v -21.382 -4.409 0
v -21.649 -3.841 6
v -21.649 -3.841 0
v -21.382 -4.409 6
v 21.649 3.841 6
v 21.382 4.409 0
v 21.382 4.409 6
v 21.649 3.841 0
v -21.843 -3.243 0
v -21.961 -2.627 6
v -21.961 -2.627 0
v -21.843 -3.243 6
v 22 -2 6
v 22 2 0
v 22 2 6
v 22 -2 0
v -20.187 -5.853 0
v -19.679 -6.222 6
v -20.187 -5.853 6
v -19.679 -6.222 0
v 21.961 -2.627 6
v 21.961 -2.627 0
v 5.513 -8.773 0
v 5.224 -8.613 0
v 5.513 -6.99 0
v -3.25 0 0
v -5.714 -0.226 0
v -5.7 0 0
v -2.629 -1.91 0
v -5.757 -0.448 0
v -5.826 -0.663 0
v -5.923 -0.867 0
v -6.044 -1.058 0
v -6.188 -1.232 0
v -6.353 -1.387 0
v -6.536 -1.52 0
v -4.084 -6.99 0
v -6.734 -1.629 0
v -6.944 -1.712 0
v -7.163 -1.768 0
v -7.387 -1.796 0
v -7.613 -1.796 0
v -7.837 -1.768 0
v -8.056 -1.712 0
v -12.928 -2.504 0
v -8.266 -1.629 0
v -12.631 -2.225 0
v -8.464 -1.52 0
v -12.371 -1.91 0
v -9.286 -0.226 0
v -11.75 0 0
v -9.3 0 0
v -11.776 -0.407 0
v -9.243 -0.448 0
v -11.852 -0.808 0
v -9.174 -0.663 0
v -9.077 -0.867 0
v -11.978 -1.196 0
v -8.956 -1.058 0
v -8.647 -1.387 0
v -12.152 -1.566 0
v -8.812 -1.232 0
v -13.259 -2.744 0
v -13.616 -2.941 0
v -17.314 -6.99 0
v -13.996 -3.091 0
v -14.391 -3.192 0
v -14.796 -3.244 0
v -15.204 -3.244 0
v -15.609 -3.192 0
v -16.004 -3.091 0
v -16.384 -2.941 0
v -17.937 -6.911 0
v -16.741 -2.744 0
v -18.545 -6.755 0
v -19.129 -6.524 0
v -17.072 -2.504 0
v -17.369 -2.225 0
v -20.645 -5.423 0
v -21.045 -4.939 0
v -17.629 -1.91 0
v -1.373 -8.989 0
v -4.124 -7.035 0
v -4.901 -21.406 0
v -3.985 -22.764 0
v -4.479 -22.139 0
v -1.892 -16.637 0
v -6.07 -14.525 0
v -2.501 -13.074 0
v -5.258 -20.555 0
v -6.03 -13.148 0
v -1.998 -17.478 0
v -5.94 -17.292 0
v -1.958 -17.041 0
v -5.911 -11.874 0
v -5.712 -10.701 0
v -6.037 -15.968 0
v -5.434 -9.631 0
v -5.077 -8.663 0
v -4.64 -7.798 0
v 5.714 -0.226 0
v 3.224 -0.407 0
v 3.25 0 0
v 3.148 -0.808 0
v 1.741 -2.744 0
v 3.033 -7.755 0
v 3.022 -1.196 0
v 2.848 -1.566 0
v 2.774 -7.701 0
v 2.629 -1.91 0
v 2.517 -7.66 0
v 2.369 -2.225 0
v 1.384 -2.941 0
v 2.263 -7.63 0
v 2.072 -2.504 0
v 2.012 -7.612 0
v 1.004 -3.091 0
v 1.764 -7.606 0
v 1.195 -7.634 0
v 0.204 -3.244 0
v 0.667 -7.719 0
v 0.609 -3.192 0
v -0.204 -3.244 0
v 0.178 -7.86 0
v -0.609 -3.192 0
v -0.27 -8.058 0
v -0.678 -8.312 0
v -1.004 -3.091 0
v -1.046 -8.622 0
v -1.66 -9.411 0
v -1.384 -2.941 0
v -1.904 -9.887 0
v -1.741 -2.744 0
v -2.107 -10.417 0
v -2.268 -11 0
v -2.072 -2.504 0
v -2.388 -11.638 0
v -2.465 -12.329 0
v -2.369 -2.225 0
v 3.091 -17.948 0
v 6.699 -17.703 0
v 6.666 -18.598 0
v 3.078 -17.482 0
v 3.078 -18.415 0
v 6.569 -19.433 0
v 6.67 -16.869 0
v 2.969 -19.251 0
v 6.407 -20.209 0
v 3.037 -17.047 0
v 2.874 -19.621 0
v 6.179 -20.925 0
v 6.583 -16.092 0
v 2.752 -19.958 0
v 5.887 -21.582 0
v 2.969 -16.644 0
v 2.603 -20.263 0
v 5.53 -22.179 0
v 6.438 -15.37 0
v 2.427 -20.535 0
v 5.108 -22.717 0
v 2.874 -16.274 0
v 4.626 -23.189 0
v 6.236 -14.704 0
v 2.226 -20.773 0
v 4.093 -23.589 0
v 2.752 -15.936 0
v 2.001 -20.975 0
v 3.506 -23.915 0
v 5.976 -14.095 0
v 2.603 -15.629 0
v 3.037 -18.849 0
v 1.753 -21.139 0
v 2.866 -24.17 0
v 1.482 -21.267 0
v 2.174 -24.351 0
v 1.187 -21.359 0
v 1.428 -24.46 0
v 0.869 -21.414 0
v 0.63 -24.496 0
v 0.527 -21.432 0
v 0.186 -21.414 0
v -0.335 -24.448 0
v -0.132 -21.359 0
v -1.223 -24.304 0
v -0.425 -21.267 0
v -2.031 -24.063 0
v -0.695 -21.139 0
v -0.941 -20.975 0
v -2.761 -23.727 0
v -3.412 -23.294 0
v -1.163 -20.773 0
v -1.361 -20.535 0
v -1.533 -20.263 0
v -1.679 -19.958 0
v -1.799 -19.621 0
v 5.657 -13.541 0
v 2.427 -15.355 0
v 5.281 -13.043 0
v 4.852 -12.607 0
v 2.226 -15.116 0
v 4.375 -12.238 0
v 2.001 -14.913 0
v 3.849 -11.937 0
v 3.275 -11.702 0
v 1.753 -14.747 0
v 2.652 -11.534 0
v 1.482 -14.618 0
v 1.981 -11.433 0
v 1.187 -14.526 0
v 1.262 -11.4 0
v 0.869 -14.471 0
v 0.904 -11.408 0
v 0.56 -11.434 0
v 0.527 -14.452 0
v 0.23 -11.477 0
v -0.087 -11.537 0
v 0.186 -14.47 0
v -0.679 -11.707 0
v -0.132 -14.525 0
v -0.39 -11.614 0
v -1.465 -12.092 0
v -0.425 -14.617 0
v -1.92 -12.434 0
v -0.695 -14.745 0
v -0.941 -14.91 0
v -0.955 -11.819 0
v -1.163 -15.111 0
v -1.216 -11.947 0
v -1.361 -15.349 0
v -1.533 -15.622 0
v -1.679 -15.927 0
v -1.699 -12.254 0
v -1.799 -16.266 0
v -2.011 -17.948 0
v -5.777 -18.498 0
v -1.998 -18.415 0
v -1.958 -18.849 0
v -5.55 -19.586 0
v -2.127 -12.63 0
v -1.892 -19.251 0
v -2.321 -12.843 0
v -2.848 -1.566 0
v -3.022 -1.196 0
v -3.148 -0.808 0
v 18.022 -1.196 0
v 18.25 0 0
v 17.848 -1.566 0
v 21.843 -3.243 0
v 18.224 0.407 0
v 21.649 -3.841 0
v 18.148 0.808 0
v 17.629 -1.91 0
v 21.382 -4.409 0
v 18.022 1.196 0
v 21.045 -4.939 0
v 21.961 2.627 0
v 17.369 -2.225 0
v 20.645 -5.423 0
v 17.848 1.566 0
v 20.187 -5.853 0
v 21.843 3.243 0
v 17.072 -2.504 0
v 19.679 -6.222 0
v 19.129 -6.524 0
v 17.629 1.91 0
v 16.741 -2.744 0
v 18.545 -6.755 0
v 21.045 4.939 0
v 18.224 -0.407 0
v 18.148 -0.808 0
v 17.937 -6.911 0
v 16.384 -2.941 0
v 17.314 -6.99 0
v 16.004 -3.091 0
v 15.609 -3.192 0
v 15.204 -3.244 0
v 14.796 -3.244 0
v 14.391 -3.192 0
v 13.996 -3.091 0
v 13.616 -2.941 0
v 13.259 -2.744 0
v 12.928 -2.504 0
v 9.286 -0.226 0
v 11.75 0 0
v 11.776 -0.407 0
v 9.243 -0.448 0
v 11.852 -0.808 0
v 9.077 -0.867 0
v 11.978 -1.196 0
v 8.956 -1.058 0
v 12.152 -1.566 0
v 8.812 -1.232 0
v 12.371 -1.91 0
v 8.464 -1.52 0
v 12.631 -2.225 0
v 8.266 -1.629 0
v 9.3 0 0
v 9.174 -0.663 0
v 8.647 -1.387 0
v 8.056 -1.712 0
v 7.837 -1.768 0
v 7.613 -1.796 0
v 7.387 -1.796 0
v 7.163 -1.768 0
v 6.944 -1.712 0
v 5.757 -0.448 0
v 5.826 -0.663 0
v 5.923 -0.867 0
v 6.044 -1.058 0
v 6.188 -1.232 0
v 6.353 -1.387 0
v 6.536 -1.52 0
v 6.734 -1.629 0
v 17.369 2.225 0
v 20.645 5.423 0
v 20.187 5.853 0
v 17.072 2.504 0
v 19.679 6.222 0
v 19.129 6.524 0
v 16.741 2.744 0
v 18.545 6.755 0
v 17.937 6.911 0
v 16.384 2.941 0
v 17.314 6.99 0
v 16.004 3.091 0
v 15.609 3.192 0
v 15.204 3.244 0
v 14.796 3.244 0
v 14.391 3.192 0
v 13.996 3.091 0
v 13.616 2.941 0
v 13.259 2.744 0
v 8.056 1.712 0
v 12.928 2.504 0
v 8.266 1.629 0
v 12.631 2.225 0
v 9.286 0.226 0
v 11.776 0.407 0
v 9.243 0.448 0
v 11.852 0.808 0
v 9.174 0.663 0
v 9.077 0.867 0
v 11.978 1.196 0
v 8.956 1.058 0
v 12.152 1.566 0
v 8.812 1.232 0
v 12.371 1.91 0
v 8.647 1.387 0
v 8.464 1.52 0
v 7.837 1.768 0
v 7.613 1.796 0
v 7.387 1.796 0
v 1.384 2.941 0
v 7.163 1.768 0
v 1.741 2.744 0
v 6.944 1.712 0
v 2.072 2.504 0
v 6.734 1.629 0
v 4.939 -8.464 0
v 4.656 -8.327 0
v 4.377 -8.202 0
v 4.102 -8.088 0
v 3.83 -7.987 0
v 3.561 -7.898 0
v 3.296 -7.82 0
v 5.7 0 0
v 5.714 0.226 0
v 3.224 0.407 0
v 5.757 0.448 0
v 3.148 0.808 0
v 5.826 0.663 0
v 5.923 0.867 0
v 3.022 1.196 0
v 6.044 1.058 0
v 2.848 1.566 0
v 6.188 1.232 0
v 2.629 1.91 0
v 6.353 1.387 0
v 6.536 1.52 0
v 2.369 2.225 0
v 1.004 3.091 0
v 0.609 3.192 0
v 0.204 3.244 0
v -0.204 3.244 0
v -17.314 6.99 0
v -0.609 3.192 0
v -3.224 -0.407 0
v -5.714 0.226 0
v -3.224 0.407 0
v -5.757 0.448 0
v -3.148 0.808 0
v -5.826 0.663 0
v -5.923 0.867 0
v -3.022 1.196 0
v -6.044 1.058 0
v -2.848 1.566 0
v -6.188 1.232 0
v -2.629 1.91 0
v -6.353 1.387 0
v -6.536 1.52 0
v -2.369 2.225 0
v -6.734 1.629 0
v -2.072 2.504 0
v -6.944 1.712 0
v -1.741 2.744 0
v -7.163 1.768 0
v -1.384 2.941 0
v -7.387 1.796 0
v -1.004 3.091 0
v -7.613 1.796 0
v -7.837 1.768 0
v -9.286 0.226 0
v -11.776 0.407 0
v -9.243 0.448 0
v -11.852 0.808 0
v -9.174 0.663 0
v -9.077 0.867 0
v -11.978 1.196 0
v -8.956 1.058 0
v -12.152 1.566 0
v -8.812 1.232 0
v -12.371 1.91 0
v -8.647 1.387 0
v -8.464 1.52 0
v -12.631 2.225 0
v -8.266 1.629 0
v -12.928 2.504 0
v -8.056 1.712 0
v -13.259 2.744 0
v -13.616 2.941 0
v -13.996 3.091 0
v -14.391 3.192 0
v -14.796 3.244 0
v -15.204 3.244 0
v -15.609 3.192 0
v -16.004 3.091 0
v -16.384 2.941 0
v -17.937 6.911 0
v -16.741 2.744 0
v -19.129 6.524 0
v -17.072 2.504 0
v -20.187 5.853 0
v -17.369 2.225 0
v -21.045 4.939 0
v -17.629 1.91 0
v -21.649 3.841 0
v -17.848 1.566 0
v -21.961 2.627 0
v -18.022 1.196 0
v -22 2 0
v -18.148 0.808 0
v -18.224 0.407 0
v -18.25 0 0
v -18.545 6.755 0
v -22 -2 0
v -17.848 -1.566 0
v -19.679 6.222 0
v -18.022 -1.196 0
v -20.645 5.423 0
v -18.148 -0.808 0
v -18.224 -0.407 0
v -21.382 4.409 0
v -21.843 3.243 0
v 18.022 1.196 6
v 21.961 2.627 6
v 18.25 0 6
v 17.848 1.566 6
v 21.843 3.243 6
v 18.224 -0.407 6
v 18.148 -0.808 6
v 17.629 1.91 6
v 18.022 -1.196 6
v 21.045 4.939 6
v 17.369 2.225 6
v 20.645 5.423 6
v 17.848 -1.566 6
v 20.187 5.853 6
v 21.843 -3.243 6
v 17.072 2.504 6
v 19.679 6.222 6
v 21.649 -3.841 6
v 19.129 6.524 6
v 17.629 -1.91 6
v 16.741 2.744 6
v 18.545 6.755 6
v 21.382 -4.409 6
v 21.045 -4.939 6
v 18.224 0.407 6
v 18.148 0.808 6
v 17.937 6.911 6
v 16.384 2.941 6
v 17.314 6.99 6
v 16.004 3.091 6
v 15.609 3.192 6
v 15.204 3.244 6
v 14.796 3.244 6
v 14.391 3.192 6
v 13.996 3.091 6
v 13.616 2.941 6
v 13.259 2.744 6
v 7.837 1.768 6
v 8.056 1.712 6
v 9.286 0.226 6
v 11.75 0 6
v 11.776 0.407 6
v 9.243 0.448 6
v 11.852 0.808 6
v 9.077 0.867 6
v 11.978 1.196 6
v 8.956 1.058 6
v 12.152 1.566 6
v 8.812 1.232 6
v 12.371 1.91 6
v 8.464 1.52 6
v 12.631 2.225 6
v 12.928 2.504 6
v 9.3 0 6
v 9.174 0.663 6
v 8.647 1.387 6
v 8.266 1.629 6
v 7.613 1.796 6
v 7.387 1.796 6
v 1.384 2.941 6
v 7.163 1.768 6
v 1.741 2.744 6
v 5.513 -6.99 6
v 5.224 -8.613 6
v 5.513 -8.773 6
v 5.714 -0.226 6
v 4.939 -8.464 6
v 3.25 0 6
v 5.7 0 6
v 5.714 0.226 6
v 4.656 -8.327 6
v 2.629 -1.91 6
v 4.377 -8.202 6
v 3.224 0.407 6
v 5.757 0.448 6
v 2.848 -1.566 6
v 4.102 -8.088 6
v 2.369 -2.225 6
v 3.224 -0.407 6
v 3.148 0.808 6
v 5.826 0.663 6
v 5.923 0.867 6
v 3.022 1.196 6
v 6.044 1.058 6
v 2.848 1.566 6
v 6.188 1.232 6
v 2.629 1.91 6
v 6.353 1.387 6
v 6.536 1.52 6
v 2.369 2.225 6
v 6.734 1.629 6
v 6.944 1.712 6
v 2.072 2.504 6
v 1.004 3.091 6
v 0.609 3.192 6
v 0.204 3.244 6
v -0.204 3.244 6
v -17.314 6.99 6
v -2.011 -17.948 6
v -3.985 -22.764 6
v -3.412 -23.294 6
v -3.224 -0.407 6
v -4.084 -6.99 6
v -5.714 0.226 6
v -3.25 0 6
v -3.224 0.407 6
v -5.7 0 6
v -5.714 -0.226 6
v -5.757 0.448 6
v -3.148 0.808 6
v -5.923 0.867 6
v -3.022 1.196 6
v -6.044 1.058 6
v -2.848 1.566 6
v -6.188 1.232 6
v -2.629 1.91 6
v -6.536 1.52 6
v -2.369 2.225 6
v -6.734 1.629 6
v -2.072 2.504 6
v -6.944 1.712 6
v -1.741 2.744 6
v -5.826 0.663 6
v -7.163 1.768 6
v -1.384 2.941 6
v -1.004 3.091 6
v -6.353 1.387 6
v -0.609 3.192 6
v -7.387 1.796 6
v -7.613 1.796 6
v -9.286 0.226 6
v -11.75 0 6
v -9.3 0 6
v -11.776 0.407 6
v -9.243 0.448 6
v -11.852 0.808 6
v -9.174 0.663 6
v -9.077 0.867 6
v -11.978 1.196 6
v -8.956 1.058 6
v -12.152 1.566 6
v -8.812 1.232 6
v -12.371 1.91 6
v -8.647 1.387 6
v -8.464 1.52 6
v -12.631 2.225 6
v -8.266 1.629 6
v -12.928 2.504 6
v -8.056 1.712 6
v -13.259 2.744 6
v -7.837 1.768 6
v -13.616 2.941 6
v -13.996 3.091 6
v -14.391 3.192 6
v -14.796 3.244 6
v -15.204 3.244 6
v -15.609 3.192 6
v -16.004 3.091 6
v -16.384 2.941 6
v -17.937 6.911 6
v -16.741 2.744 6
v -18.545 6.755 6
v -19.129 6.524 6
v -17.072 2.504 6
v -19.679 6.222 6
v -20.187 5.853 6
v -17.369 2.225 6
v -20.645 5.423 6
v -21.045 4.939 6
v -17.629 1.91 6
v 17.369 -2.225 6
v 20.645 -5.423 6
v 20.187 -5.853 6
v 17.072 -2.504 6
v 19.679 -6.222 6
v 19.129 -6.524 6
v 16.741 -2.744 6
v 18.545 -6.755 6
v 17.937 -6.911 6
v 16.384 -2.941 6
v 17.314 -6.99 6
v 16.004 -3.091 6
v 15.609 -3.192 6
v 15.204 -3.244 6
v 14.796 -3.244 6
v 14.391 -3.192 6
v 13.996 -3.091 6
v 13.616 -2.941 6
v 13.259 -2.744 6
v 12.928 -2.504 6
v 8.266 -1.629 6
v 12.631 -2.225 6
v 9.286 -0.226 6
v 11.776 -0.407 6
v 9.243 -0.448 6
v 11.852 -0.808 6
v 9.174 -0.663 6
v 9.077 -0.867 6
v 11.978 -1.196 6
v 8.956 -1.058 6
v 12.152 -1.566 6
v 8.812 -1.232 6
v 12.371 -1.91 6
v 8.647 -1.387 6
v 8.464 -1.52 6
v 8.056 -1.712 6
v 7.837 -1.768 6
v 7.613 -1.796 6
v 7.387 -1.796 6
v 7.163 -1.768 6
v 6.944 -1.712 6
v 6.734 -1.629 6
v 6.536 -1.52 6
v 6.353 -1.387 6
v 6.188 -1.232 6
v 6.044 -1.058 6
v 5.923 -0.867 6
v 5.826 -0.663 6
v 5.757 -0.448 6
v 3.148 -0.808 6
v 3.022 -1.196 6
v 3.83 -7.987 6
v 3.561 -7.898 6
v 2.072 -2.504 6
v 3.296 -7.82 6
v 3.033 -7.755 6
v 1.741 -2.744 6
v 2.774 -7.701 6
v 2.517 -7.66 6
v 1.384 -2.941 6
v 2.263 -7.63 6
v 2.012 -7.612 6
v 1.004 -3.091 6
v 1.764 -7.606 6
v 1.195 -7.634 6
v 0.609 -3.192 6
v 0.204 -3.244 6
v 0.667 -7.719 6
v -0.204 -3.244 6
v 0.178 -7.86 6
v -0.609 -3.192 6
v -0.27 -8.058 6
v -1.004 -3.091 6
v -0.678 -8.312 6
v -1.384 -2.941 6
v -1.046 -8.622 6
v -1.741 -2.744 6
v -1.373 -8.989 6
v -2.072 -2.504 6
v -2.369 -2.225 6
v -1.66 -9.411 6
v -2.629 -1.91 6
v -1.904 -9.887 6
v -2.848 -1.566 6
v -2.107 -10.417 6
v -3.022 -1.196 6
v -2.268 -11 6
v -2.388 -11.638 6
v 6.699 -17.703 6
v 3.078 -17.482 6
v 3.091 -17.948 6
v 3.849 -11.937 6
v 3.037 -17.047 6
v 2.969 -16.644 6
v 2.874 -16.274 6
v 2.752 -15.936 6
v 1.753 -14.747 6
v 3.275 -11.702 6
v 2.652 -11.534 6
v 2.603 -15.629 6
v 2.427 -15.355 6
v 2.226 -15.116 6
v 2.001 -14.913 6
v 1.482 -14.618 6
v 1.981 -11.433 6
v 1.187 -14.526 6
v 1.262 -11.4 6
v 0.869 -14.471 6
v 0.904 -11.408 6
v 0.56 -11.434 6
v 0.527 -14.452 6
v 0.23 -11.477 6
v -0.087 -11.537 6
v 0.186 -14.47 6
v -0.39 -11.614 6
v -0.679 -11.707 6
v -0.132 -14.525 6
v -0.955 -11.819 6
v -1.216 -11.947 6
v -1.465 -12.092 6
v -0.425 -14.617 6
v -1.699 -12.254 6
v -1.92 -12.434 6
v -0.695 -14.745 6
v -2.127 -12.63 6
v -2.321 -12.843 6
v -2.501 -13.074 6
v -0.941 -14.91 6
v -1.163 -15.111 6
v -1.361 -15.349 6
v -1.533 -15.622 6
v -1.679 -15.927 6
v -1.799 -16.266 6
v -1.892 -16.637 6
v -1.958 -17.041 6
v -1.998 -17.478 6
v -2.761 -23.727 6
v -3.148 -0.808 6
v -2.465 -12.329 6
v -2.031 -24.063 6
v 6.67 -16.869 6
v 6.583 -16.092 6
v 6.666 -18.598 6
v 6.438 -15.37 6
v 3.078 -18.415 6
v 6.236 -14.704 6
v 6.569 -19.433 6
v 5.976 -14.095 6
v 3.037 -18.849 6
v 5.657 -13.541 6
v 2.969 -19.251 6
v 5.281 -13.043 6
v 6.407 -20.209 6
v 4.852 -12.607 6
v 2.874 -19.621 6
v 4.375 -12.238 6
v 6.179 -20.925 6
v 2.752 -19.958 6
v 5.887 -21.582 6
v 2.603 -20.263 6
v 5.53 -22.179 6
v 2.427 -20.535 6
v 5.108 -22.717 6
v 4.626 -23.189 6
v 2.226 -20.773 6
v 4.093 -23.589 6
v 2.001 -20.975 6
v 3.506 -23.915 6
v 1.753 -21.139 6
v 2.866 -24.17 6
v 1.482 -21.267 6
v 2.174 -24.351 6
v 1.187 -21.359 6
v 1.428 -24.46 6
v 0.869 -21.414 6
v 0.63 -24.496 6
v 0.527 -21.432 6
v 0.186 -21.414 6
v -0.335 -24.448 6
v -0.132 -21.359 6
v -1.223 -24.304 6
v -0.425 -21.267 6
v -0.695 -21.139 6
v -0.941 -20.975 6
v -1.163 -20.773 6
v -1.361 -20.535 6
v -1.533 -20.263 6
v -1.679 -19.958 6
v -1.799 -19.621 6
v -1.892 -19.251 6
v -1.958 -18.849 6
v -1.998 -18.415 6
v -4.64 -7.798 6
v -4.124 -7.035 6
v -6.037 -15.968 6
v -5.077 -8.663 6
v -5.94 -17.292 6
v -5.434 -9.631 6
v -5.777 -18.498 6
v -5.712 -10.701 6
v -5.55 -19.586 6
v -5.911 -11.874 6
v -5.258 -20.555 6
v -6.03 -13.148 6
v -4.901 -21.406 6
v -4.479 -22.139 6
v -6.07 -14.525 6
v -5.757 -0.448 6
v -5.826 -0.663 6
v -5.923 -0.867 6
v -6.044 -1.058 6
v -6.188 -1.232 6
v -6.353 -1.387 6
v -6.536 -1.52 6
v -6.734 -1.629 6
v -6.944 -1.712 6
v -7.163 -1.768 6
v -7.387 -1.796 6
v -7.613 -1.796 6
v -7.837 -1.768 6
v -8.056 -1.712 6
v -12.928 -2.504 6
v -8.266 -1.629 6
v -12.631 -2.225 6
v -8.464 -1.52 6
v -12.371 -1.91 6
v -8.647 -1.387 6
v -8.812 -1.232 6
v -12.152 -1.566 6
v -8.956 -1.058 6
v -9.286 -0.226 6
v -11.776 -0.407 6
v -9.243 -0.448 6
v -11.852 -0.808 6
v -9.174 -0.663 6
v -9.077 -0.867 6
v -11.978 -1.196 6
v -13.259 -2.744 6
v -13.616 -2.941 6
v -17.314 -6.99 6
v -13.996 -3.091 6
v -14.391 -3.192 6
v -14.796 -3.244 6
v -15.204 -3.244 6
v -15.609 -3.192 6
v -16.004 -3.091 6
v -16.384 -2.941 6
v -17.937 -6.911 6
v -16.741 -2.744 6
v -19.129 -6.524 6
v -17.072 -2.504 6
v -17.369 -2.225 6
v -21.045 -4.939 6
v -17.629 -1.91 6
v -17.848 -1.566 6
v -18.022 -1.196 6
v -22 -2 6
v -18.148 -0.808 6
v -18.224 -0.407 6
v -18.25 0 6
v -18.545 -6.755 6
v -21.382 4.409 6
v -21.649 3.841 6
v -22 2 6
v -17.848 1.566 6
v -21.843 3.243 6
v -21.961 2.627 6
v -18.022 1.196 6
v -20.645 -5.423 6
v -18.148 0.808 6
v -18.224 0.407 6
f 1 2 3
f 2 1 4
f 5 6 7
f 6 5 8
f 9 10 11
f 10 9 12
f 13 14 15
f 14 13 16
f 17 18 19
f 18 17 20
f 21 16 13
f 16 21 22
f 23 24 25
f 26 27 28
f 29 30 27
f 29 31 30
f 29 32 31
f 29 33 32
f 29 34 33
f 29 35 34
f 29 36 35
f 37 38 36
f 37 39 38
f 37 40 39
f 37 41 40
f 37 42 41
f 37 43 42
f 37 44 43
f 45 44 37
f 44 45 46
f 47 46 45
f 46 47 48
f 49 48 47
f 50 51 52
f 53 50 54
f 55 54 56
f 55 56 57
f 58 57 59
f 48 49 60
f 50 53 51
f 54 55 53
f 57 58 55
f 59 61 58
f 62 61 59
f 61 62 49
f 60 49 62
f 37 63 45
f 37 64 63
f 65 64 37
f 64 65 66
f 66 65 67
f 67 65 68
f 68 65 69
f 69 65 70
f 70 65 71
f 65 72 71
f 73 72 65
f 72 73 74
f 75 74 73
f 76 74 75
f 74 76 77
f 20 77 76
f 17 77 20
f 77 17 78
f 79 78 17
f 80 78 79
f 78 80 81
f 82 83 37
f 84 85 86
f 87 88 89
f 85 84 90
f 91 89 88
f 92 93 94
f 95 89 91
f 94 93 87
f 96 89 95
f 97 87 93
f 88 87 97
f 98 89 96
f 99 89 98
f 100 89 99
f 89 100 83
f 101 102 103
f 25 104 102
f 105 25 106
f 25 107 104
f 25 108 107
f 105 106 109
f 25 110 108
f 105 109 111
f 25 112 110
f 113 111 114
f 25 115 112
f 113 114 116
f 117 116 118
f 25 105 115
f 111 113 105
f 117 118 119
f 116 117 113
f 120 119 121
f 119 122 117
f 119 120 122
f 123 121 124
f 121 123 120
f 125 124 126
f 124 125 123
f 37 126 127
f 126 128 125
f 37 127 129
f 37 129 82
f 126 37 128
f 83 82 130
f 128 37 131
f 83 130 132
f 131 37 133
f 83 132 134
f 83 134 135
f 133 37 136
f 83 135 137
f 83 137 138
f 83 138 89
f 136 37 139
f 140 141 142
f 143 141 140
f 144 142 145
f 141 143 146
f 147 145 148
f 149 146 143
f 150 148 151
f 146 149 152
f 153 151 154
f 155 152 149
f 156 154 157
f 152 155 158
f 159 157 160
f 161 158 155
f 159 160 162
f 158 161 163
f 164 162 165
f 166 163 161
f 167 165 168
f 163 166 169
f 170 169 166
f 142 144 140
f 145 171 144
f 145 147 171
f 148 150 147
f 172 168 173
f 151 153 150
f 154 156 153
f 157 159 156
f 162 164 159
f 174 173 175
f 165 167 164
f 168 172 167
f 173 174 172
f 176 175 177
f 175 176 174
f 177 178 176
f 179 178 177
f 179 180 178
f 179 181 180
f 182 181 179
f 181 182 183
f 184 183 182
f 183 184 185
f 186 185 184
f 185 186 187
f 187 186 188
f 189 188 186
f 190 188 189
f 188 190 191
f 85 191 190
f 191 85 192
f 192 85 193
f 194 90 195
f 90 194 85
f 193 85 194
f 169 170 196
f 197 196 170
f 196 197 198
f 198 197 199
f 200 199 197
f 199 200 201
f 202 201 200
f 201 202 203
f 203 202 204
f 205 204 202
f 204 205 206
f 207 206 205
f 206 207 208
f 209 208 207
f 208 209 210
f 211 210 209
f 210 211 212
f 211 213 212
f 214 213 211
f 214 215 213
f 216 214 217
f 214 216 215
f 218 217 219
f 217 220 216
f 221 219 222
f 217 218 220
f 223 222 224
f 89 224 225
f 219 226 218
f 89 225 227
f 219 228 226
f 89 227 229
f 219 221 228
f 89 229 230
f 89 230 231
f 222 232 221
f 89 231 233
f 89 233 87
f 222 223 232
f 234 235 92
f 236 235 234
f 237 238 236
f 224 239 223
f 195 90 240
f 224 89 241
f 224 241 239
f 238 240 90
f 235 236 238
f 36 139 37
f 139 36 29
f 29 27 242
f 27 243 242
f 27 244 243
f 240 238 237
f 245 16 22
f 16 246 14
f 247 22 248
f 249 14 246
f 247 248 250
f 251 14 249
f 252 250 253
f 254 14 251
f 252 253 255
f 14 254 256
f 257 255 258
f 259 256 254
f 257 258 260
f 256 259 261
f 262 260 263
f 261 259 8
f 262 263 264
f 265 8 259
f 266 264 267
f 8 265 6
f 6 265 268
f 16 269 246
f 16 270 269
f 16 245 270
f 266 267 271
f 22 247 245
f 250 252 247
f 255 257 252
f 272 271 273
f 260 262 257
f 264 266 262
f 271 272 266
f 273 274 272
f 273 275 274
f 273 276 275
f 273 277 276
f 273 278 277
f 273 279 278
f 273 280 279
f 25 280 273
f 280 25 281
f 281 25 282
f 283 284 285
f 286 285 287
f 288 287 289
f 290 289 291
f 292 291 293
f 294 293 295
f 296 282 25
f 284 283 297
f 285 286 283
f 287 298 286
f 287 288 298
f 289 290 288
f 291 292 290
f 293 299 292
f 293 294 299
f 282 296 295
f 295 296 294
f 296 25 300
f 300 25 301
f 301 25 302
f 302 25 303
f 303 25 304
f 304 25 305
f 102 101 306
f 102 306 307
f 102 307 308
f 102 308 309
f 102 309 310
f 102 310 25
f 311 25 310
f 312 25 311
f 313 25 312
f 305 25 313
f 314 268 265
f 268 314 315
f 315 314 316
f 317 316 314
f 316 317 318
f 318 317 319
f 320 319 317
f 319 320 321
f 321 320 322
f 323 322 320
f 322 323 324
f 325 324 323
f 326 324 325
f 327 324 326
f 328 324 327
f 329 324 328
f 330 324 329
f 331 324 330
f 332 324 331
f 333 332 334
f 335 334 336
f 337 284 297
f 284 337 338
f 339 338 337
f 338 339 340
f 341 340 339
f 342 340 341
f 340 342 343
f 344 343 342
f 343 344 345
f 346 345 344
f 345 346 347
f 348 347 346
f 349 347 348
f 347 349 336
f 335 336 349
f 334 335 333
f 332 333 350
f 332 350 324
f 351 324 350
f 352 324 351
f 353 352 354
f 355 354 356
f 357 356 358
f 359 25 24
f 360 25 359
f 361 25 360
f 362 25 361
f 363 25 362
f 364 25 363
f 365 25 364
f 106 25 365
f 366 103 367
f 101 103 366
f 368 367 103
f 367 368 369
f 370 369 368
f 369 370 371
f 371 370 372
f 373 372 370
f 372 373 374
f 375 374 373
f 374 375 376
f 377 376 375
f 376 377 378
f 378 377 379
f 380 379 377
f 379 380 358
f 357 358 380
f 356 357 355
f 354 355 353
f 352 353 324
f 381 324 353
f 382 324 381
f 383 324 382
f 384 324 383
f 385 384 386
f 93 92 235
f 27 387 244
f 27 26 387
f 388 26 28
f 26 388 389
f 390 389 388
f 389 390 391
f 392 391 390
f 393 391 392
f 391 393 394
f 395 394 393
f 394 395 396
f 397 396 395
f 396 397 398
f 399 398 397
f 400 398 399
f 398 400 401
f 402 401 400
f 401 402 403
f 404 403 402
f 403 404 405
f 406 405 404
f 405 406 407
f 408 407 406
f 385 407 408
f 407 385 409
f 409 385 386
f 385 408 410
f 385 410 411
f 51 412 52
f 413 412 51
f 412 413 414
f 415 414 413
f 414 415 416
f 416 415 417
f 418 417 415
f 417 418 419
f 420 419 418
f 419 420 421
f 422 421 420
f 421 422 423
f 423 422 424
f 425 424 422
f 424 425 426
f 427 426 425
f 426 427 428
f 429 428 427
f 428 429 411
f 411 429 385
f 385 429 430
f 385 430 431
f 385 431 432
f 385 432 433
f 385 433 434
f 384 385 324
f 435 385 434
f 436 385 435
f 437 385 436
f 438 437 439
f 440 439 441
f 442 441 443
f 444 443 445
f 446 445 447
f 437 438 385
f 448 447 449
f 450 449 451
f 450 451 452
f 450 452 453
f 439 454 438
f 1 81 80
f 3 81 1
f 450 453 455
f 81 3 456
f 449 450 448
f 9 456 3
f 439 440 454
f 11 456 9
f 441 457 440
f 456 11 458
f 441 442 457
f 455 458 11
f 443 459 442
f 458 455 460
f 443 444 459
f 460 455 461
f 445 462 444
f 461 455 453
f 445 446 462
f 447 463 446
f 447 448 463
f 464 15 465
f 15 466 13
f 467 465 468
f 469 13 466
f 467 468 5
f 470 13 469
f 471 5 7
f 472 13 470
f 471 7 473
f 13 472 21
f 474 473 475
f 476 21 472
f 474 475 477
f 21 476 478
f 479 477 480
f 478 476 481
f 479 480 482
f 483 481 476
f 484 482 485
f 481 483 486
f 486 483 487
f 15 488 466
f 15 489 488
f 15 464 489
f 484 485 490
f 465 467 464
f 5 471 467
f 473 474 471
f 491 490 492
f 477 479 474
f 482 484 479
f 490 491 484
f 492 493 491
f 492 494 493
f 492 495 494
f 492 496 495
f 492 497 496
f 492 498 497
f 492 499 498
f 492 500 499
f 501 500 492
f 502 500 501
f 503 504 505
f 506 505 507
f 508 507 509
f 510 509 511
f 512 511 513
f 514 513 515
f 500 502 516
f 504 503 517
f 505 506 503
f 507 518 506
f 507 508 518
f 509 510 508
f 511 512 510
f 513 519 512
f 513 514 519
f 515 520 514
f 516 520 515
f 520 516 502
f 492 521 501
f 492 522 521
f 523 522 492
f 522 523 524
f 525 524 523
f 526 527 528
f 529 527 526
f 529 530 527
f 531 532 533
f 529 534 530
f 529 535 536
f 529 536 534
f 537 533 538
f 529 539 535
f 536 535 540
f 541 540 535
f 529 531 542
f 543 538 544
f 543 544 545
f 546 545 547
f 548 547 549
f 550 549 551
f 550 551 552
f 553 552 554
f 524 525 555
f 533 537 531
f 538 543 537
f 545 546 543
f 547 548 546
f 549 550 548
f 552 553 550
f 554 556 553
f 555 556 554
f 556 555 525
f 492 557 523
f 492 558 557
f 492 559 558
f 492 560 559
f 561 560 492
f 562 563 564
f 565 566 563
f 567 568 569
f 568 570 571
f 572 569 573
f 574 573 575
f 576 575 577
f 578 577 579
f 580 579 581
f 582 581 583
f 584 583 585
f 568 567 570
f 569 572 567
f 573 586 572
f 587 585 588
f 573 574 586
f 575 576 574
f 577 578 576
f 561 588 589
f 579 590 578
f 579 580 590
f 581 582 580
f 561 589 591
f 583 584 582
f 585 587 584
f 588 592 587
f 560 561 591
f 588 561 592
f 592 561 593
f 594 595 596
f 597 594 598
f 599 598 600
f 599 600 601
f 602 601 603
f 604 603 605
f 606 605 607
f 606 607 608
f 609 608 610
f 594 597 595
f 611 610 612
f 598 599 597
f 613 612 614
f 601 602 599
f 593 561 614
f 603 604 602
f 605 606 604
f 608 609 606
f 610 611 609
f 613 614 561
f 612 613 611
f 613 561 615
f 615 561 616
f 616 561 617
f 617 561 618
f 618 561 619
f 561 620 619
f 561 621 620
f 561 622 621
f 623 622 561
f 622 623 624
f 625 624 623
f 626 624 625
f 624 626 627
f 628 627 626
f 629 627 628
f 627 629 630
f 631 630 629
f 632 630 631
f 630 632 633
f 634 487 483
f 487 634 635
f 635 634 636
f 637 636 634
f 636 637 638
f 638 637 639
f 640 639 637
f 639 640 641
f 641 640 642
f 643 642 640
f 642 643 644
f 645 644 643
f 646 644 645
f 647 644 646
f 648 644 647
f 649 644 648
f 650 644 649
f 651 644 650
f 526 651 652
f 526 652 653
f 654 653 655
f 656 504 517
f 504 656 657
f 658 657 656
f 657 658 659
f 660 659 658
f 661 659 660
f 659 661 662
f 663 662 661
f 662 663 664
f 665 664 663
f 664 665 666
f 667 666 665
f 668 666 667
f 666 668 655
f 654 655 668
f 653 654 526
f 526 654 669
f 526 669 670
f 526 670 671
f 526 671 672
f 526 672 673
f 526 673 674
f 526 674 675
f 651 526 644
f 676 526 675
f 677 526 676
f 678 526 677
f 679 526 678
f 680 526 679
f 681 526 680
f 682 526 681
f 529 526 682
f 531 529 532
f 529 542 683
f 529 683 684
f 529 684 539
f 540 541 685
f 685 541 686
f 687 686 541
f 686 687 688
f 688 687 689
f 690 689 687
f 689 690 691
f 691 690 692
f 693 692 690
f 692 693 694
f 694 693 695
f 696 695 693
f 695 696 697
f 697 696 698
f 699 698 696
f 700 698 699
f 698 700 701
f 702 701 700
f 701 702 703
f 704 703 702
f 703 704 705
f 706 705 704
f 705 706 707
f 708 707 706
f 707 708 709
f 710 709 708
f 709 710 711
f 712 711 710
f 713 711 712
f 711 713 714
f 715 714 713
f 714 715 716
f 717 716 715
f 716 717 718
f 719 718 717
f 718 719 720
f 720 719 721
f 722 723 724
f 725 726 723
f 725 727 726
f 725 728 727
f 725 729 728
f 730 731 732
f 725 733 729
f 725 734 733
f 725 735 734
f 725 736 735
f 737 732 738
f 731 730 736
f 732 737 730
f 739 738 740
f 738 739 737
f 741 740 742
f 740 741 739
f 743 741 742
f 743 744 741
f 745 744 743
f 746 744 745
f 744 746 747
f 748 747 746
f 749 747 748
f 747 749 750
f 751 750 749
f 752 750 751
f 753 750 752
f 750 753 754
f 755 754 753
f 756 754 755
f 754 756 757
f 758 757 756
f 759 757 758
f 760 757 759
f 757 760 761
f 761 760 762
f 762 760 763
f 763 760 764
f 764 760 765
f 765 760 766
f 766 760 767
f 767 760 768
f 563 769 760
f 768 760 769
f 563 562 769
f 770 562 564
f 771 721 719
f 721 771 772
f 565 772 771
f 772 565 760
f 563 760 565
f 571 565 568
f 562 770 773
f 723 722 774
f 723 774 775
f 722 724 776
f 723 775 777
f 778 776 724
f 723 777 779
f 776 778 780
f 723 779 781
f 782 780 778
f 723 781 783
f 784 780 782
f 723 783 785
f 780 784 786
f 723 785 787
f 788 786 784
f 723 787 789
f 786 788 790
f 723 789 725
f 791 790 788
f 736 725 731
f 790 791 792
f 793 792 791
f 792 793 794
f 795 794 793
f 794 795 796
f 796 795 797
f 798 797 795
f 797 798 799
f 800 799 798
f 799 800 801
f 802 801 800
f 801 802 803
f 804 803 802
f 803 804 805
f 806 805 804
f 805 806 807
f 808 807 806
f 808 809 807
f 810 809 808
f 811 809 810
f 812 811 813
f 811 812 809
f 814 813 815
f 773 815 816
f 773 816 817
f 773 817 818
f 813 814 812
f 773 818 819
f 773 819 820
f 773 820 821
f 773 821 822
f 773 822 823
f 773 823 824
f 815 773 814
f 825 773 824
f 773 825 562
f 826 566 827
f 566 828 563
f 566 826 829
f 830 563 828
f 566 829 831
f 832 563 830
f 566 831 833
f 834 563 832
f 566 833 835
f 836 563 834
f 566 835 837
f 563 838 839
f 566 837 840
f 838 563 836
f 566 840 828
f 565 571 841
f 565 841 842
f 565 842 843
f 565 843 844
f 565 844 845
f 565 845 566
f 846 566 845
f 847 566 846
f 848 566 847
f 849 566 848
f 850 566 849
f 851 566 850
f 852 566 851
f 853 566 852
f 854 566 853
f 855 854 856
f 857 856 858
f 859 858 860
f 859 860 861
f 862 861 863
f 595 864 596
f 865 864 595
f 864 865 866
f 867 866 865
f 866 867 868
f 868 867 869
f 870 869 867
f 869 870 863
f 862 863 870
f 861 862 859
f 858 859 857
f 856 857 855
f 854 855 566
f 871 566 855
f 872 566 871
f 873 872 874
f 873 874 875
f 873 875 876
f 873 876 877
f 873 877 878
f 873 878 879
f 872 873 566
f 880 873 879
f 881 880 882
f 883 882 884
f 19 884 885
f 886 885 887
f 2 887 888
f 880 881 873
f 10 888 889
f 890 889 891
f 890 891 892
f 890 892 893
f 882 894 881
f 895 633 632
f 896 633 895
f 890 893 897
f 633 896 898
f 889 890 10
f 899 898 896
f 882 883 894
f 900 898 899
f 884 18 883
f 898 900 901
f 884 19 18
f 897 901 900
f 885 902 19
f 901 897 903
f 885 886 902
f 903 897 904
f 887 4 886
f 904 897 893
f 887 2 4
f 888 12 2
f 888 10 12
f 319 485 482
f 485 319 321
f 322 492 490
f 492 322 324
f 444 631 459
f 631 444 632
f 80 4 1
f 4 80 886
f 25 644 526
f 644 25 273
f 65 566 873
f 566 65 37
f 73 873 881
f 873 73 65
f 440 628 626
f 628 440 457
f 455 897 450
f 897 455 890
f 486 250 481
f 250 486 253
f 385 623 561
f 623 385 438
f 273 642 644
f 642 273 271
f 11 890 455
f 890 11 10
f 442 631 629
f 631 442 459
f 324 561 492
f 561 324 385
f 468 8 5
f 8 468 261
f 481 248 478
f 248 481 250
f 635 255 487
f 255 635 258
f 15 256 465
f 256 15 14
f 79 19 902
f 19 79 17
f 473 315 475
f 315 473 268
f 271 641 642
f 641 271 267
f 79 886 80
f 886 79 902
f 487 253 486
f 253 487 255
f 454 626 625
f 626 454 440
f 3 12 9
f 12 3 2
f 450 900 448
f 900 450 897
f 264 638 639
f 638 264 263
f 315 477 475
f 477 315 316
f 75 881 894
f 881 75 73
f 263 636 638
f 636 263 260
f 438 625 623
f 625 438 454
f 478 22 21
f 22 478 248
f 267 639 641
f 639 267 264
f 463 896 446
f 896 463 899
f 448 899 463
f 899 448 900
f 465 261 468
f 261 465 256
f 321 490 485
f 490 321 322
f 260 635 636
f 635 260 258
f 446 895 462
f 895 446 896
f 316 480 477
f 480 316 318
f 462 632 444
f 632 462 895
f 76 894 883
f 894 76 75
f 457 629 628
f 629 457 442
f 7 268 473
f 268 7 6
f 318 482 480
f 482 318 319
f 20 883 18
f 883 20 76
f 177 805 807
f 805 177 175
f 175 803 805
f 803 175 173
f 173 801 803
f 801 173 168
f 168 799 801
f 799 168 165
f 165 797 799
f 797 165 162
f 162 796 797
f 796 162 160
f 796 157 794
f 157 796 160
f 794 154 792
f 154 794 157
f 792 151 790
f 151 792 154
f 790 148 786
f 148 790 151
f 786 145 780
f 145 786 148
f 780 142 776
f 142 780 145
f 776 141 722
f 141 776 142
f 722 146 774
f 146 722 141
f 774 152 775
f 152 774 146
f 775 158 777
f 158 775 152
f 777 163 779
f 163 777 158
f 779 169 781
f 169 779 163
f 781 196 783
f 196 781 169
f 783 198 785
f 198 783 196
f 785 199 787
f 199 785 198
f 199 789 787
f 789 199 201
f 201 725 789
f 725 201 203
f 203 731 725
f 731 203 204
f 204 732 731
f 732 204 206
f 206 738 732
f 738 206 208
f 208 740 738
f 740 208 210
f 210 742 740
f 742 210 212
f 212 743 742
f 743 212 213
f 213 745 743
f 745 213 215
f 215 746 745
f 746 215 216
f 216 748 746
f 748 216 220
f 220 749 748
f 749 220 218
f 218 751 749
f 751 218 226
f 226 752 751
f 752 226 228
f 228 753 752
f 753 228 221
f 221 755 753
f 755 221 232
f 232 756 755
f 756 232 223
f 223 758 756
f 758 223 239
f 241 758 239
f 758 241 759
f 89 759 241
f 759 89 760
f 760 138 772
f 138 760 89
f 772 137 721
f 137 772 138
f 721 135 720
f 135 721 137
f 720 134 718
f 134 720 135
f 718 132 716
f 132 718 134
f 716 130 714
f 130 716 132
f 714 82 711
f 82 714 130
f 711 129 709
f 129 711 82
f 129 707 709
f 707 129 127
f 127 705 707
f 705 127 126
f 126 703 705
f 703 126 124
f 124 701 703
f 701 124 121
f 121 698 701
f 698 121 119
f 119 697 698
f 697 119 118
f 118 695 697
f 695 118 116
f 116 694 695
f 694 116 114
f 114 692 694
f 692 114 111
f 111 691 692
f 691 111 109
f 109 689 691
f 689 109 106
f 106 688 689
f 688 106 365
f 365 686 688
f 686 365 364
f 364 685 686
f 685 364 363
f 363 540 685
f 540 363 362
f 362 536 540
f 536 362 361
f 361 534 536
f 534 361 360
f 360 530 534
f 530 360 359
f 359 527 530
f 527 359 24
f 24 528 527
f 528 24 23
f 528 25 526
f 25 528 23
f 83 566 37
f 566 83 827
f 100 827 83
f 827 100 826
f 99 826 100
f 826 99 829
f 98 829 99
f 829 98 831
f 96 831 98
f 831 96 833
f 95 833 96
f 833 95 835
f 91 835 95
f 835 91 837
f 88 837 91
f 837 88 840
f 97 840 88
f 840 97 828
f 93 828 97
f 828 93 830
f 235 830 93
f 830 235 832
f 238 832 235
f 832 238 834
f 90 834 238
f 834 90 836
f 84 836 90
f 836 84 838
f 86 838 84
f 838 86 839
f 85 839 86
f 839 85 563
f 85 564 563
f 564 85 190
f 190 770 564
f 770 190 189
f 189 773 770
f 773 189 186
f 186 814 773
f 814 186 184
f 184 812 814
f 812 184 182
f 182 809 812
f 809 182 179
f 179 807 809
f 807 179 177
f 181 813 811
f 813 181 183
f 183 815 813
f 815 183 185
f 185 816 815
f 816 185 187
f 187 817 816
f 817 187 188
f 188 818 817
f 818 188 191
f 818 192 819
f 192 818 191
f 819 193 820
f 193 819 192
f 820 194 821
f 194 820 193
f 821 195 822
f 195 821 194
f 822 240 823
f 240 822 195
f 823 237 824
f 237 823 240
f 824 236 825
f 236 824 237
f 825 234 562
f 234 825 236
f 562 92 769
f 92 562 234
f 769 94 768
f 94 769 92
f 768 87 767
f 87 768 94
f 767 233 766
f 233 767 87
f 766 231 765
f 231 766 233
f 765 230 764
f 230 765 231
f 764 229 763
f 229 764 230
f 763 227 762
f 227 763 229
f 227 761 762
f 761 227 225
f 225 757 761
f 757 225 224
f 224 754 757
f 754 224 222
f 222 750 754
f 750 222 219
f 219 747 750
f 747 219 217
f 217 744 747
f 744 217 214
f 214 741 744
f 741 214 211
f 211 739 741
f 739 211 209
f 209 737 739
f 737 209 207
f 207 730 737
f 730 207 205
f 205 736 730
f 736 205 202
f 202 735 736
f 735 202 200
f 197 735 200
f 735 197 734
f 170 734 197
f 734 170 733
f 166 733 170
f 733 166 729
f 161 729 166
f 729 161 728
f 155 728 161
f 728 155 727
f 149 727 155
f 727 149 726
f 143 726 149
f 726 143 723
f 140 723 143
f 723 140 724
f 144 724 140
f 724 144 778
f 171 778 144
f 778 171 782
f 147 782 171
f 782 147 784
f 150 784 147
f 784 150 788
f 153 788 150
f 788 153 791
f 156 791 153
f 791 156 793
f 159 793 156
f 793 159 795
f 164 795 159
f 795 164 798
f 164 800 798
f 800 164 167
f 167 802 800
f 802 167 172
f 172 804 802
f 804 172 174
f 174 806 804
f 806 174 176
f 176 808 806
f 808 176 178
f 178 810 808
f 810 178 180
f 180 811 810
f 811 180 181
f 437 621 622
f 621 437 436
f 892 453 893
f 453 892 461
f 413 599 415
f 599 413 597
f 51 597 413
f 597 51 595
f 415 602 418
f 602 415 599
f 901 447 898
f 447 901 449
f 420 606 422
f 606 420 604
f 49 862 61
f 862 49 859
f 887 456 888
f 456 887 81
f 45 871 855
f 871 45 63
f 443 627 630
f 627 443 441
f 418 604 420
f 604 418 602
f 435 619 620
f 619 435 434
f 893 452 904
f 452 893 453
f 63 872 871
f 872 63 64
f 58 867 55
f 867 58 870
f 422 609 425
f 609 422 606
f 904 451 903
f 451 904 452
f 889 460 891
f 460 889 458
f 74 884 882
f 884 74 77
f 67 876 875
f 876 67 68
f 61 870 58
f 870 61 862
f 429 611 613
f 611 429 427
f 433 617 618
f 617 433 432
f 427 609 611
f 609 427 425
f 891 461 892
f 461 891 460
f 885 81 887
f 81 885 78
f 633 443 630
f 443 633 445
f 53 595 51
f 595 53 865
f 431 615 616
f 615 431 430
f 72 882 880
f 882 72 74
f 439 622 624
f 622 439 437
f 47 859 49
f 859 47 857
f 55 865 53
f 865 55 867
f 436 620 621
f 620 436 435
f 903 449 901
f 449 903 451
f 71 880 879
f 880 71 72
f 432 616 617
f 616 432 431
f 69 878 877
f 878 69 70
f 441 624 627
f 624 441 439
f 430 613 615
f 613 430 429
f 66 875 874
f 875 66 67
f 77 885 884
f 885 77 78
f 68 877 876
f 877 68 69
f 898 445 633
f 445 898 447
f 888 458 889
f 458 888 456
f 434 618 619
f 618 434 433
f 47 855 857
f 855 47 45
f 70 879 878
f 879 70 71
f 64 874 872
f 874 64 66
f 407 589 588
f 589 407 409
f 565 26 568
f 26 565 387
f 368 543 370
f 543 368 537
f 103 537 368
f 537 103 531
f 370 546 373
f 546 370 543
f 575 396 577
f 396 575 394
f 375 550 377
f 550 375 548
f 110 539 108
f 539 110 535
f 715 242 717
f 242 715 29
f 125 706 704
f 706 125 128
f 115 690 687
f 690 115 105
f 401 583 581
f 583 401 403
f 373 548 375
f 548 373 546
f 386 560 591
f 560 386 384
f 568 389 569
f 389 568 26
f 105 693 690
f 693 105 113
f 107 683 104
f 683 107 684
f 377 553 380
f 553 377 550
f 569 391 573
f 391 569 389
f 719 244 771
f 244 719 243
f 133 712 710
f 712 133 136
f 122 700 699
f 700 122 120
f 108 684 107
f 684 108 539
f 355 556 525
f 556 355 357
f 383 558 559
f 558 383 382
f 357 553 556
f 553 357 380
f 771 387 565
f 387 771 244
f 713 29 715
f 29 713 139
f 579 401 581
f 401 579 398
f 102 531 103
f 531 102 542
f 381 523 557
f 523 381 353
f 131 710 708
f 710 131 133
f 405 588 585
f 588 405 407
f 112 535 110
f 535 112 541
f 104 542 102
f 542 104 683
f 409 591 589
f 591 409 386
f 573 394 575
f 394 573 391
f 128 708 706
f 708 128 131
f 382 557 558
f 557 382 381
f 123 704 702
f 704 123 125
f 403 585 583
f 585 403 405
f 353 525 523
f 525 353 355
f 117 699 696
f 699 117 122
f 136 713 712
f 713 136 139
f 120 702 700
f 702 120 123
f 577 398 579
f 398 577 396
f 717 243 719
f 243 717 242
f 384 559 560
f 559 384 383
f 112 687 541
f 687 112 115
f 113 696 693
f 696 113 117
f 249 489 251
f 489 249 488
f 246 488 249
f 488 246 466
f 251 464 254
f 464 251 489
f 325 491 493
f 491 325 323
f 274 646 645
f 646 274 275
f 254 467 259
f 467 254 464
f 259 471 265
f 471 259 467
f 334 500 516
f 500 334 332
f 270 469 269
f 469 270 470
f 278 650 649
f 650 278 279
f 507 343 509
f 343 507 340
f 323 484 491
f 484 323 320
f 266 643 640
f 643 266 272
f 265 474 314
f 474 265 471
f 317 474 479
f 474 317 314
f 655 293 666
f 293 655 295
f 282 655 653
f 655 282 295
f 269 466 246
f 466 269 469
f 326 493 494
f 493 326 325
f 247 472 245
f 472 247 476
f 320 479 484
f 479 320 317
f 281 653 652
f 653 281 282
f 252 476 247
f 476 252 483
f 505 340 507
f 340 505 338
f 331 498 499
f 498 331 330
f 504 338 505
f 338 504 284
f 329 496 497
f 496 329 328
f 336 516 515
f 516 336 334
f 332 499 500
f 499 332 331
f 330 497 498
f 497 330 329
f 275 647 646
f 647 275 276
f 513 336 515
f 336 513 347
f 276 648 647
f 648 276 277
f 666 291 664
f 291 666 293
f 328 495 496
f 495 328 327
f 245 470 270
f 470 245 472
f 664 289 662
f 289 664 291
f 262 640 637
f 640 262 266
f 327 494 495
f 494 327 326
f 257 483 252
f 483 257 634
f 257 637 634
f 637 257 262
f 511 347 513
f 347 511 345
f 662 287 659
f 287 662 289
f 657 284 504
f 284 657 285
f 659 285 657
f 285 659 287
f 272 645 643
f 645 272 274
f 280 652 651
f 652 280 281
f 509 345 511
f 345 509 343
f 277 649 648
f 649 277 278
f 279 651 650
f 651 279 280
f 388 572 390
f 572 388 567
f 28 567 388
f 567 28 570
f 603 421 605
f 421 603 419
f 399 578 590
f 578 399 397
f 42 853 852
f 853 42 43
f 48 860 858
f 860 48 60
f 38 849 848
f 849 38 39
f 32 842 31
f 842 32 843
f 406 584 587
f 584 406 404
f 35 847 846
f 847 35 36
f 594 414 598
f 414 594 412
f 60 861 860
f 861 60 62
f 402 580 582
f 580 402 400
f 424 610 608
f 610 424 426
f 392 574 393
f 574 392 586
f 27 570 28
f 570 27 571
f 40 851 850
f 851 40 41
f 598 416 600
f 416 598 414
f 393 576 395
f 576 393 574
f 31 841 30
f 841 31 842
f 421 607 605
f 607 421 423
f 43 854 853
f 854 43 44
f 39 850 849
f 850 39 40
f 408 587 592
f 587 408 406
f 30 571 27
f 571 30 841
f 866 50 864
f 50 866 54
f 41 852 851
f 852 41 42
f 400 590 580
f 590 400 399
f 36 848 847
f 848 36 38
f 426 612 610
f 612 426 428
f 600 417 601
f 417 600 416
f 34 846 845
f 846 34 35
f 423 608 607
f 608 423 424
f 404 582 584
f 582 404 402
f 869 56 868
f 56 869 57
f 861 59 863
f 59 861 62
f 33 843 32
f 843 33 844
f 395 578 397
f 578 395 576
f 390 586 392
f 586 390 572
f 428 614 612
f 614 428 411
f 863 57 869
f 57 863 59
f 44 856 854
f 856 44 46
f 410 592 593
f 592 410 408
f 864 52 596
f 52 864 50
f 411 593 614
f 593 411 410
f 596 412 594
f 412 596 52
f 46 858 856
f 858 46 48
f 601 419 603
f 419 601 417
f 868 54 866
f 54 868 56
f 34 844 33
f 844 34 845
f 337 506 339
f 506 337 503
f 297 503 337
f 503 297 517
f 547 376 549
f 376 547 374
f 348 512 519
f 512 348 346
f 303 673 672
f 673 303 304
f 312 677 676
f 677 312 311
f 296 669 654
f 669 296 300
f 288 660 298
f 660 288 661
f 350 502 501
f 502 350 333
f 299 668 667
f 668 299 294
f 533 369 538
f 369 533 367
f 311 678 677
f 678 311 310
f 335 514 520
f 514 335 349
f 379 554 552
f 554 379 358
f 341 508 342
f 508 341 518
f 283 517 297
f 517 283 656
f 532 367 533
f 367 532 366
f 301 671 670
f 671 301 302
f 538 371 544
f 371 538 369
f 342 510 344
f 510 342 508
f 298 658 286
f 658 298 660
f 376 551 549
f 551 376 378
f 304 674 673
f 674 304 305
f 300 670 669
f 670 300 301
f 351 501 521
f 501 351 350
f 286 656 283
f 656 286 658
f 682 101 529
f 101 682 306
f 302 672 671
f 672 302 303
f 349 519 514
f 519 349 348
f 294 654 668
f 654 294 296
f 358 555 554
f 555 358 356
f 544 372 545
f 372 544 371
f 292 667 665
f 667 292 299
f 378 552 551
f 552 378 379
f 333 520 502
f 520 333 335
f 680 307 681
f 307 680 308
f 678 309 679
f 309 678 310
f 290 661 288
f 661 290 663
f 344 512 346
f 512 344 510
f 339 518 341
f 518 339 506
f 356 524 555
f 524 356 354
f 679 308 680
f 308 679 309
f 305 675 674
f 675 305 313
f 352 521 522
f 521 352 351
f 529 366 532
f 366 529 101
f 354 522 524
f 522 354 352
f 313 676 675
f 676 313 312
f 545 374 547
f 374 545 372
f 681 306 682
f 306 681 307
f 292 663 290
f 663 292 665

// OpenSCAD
$fn = 50;


difference() {
	union() {
		hull() {
			translate(v = [-17.0000000000, 2.0000000000, 0]) {
				cylinder(h = 6, r = 5);
			}
			translate(v = [17.0000000000, 2.0000000000, 0]) {
				cylinder(h = 6, r = 5);
			}
			translate(v = [-17.0000000000, -2.0000000000, 0]) {
				cylinder(h = 6, r = 5);
			}
			translate(v = [17.0000000000, -2.0000000000, 0]) {
				cylinder(h = 6, r = 5);
			}
		}
		translate(v = [0, -5, 0]) {
			linear_extrude(height = 6) {
				text(font = "DejaVu Sans Mono:style=Bold", halign = "center", size = 19.0000000000, text = "6", valign = "top");
			}
		}
	}
	union() {
		translate(v = [-15.0000000000, 0.0000000000, 0]) {
			translate(v = [0, 0, -100]) {
				cylinder(h = 200, r = 3.2500000000);
			}
		}
		translate(v = [0, 0, -100]) {
			cylinder(h = 200, r = 3.2500000000);
		}
		translate(v = [15.0000000000, 0.0000000000, 0]) {
			translate(v = [0, 0, -100]) {
				cylinder(h = 200, r = 3.2500000000);
			}
		}
		translate(v = [-15.0000000000, 0.0000000000, 0]) {
			translate(v = [0, 0, -100]) {
				cylinder(h = 200, r = 1.8000000000);
			}
		}
		translate(v = [-7.5000000000, 0.0000000000, 0]) {
			translate(v = [0, 0, -100]) {
				cylinder(h = 200, r = 1.8000000000);
			}
		}
		translate(v = [0, 0, -100]) {
			cylinder(h = 200, r = 1.8000000000);
		}
		translate(v = [7.5000000000, 0.0000000000, 0]) {
			translate(v = [0, 0, -100]) {
				cylinder(h = 200, r = 1.8000000000);
			}
		}
		translate(v = [15.0000000000, 0.0000000000, 0]) {
			translate(v = [0, 0, -100]) {
				cylinder(h = 200, r = 1.8000000000);
			}
		}
	}
}
